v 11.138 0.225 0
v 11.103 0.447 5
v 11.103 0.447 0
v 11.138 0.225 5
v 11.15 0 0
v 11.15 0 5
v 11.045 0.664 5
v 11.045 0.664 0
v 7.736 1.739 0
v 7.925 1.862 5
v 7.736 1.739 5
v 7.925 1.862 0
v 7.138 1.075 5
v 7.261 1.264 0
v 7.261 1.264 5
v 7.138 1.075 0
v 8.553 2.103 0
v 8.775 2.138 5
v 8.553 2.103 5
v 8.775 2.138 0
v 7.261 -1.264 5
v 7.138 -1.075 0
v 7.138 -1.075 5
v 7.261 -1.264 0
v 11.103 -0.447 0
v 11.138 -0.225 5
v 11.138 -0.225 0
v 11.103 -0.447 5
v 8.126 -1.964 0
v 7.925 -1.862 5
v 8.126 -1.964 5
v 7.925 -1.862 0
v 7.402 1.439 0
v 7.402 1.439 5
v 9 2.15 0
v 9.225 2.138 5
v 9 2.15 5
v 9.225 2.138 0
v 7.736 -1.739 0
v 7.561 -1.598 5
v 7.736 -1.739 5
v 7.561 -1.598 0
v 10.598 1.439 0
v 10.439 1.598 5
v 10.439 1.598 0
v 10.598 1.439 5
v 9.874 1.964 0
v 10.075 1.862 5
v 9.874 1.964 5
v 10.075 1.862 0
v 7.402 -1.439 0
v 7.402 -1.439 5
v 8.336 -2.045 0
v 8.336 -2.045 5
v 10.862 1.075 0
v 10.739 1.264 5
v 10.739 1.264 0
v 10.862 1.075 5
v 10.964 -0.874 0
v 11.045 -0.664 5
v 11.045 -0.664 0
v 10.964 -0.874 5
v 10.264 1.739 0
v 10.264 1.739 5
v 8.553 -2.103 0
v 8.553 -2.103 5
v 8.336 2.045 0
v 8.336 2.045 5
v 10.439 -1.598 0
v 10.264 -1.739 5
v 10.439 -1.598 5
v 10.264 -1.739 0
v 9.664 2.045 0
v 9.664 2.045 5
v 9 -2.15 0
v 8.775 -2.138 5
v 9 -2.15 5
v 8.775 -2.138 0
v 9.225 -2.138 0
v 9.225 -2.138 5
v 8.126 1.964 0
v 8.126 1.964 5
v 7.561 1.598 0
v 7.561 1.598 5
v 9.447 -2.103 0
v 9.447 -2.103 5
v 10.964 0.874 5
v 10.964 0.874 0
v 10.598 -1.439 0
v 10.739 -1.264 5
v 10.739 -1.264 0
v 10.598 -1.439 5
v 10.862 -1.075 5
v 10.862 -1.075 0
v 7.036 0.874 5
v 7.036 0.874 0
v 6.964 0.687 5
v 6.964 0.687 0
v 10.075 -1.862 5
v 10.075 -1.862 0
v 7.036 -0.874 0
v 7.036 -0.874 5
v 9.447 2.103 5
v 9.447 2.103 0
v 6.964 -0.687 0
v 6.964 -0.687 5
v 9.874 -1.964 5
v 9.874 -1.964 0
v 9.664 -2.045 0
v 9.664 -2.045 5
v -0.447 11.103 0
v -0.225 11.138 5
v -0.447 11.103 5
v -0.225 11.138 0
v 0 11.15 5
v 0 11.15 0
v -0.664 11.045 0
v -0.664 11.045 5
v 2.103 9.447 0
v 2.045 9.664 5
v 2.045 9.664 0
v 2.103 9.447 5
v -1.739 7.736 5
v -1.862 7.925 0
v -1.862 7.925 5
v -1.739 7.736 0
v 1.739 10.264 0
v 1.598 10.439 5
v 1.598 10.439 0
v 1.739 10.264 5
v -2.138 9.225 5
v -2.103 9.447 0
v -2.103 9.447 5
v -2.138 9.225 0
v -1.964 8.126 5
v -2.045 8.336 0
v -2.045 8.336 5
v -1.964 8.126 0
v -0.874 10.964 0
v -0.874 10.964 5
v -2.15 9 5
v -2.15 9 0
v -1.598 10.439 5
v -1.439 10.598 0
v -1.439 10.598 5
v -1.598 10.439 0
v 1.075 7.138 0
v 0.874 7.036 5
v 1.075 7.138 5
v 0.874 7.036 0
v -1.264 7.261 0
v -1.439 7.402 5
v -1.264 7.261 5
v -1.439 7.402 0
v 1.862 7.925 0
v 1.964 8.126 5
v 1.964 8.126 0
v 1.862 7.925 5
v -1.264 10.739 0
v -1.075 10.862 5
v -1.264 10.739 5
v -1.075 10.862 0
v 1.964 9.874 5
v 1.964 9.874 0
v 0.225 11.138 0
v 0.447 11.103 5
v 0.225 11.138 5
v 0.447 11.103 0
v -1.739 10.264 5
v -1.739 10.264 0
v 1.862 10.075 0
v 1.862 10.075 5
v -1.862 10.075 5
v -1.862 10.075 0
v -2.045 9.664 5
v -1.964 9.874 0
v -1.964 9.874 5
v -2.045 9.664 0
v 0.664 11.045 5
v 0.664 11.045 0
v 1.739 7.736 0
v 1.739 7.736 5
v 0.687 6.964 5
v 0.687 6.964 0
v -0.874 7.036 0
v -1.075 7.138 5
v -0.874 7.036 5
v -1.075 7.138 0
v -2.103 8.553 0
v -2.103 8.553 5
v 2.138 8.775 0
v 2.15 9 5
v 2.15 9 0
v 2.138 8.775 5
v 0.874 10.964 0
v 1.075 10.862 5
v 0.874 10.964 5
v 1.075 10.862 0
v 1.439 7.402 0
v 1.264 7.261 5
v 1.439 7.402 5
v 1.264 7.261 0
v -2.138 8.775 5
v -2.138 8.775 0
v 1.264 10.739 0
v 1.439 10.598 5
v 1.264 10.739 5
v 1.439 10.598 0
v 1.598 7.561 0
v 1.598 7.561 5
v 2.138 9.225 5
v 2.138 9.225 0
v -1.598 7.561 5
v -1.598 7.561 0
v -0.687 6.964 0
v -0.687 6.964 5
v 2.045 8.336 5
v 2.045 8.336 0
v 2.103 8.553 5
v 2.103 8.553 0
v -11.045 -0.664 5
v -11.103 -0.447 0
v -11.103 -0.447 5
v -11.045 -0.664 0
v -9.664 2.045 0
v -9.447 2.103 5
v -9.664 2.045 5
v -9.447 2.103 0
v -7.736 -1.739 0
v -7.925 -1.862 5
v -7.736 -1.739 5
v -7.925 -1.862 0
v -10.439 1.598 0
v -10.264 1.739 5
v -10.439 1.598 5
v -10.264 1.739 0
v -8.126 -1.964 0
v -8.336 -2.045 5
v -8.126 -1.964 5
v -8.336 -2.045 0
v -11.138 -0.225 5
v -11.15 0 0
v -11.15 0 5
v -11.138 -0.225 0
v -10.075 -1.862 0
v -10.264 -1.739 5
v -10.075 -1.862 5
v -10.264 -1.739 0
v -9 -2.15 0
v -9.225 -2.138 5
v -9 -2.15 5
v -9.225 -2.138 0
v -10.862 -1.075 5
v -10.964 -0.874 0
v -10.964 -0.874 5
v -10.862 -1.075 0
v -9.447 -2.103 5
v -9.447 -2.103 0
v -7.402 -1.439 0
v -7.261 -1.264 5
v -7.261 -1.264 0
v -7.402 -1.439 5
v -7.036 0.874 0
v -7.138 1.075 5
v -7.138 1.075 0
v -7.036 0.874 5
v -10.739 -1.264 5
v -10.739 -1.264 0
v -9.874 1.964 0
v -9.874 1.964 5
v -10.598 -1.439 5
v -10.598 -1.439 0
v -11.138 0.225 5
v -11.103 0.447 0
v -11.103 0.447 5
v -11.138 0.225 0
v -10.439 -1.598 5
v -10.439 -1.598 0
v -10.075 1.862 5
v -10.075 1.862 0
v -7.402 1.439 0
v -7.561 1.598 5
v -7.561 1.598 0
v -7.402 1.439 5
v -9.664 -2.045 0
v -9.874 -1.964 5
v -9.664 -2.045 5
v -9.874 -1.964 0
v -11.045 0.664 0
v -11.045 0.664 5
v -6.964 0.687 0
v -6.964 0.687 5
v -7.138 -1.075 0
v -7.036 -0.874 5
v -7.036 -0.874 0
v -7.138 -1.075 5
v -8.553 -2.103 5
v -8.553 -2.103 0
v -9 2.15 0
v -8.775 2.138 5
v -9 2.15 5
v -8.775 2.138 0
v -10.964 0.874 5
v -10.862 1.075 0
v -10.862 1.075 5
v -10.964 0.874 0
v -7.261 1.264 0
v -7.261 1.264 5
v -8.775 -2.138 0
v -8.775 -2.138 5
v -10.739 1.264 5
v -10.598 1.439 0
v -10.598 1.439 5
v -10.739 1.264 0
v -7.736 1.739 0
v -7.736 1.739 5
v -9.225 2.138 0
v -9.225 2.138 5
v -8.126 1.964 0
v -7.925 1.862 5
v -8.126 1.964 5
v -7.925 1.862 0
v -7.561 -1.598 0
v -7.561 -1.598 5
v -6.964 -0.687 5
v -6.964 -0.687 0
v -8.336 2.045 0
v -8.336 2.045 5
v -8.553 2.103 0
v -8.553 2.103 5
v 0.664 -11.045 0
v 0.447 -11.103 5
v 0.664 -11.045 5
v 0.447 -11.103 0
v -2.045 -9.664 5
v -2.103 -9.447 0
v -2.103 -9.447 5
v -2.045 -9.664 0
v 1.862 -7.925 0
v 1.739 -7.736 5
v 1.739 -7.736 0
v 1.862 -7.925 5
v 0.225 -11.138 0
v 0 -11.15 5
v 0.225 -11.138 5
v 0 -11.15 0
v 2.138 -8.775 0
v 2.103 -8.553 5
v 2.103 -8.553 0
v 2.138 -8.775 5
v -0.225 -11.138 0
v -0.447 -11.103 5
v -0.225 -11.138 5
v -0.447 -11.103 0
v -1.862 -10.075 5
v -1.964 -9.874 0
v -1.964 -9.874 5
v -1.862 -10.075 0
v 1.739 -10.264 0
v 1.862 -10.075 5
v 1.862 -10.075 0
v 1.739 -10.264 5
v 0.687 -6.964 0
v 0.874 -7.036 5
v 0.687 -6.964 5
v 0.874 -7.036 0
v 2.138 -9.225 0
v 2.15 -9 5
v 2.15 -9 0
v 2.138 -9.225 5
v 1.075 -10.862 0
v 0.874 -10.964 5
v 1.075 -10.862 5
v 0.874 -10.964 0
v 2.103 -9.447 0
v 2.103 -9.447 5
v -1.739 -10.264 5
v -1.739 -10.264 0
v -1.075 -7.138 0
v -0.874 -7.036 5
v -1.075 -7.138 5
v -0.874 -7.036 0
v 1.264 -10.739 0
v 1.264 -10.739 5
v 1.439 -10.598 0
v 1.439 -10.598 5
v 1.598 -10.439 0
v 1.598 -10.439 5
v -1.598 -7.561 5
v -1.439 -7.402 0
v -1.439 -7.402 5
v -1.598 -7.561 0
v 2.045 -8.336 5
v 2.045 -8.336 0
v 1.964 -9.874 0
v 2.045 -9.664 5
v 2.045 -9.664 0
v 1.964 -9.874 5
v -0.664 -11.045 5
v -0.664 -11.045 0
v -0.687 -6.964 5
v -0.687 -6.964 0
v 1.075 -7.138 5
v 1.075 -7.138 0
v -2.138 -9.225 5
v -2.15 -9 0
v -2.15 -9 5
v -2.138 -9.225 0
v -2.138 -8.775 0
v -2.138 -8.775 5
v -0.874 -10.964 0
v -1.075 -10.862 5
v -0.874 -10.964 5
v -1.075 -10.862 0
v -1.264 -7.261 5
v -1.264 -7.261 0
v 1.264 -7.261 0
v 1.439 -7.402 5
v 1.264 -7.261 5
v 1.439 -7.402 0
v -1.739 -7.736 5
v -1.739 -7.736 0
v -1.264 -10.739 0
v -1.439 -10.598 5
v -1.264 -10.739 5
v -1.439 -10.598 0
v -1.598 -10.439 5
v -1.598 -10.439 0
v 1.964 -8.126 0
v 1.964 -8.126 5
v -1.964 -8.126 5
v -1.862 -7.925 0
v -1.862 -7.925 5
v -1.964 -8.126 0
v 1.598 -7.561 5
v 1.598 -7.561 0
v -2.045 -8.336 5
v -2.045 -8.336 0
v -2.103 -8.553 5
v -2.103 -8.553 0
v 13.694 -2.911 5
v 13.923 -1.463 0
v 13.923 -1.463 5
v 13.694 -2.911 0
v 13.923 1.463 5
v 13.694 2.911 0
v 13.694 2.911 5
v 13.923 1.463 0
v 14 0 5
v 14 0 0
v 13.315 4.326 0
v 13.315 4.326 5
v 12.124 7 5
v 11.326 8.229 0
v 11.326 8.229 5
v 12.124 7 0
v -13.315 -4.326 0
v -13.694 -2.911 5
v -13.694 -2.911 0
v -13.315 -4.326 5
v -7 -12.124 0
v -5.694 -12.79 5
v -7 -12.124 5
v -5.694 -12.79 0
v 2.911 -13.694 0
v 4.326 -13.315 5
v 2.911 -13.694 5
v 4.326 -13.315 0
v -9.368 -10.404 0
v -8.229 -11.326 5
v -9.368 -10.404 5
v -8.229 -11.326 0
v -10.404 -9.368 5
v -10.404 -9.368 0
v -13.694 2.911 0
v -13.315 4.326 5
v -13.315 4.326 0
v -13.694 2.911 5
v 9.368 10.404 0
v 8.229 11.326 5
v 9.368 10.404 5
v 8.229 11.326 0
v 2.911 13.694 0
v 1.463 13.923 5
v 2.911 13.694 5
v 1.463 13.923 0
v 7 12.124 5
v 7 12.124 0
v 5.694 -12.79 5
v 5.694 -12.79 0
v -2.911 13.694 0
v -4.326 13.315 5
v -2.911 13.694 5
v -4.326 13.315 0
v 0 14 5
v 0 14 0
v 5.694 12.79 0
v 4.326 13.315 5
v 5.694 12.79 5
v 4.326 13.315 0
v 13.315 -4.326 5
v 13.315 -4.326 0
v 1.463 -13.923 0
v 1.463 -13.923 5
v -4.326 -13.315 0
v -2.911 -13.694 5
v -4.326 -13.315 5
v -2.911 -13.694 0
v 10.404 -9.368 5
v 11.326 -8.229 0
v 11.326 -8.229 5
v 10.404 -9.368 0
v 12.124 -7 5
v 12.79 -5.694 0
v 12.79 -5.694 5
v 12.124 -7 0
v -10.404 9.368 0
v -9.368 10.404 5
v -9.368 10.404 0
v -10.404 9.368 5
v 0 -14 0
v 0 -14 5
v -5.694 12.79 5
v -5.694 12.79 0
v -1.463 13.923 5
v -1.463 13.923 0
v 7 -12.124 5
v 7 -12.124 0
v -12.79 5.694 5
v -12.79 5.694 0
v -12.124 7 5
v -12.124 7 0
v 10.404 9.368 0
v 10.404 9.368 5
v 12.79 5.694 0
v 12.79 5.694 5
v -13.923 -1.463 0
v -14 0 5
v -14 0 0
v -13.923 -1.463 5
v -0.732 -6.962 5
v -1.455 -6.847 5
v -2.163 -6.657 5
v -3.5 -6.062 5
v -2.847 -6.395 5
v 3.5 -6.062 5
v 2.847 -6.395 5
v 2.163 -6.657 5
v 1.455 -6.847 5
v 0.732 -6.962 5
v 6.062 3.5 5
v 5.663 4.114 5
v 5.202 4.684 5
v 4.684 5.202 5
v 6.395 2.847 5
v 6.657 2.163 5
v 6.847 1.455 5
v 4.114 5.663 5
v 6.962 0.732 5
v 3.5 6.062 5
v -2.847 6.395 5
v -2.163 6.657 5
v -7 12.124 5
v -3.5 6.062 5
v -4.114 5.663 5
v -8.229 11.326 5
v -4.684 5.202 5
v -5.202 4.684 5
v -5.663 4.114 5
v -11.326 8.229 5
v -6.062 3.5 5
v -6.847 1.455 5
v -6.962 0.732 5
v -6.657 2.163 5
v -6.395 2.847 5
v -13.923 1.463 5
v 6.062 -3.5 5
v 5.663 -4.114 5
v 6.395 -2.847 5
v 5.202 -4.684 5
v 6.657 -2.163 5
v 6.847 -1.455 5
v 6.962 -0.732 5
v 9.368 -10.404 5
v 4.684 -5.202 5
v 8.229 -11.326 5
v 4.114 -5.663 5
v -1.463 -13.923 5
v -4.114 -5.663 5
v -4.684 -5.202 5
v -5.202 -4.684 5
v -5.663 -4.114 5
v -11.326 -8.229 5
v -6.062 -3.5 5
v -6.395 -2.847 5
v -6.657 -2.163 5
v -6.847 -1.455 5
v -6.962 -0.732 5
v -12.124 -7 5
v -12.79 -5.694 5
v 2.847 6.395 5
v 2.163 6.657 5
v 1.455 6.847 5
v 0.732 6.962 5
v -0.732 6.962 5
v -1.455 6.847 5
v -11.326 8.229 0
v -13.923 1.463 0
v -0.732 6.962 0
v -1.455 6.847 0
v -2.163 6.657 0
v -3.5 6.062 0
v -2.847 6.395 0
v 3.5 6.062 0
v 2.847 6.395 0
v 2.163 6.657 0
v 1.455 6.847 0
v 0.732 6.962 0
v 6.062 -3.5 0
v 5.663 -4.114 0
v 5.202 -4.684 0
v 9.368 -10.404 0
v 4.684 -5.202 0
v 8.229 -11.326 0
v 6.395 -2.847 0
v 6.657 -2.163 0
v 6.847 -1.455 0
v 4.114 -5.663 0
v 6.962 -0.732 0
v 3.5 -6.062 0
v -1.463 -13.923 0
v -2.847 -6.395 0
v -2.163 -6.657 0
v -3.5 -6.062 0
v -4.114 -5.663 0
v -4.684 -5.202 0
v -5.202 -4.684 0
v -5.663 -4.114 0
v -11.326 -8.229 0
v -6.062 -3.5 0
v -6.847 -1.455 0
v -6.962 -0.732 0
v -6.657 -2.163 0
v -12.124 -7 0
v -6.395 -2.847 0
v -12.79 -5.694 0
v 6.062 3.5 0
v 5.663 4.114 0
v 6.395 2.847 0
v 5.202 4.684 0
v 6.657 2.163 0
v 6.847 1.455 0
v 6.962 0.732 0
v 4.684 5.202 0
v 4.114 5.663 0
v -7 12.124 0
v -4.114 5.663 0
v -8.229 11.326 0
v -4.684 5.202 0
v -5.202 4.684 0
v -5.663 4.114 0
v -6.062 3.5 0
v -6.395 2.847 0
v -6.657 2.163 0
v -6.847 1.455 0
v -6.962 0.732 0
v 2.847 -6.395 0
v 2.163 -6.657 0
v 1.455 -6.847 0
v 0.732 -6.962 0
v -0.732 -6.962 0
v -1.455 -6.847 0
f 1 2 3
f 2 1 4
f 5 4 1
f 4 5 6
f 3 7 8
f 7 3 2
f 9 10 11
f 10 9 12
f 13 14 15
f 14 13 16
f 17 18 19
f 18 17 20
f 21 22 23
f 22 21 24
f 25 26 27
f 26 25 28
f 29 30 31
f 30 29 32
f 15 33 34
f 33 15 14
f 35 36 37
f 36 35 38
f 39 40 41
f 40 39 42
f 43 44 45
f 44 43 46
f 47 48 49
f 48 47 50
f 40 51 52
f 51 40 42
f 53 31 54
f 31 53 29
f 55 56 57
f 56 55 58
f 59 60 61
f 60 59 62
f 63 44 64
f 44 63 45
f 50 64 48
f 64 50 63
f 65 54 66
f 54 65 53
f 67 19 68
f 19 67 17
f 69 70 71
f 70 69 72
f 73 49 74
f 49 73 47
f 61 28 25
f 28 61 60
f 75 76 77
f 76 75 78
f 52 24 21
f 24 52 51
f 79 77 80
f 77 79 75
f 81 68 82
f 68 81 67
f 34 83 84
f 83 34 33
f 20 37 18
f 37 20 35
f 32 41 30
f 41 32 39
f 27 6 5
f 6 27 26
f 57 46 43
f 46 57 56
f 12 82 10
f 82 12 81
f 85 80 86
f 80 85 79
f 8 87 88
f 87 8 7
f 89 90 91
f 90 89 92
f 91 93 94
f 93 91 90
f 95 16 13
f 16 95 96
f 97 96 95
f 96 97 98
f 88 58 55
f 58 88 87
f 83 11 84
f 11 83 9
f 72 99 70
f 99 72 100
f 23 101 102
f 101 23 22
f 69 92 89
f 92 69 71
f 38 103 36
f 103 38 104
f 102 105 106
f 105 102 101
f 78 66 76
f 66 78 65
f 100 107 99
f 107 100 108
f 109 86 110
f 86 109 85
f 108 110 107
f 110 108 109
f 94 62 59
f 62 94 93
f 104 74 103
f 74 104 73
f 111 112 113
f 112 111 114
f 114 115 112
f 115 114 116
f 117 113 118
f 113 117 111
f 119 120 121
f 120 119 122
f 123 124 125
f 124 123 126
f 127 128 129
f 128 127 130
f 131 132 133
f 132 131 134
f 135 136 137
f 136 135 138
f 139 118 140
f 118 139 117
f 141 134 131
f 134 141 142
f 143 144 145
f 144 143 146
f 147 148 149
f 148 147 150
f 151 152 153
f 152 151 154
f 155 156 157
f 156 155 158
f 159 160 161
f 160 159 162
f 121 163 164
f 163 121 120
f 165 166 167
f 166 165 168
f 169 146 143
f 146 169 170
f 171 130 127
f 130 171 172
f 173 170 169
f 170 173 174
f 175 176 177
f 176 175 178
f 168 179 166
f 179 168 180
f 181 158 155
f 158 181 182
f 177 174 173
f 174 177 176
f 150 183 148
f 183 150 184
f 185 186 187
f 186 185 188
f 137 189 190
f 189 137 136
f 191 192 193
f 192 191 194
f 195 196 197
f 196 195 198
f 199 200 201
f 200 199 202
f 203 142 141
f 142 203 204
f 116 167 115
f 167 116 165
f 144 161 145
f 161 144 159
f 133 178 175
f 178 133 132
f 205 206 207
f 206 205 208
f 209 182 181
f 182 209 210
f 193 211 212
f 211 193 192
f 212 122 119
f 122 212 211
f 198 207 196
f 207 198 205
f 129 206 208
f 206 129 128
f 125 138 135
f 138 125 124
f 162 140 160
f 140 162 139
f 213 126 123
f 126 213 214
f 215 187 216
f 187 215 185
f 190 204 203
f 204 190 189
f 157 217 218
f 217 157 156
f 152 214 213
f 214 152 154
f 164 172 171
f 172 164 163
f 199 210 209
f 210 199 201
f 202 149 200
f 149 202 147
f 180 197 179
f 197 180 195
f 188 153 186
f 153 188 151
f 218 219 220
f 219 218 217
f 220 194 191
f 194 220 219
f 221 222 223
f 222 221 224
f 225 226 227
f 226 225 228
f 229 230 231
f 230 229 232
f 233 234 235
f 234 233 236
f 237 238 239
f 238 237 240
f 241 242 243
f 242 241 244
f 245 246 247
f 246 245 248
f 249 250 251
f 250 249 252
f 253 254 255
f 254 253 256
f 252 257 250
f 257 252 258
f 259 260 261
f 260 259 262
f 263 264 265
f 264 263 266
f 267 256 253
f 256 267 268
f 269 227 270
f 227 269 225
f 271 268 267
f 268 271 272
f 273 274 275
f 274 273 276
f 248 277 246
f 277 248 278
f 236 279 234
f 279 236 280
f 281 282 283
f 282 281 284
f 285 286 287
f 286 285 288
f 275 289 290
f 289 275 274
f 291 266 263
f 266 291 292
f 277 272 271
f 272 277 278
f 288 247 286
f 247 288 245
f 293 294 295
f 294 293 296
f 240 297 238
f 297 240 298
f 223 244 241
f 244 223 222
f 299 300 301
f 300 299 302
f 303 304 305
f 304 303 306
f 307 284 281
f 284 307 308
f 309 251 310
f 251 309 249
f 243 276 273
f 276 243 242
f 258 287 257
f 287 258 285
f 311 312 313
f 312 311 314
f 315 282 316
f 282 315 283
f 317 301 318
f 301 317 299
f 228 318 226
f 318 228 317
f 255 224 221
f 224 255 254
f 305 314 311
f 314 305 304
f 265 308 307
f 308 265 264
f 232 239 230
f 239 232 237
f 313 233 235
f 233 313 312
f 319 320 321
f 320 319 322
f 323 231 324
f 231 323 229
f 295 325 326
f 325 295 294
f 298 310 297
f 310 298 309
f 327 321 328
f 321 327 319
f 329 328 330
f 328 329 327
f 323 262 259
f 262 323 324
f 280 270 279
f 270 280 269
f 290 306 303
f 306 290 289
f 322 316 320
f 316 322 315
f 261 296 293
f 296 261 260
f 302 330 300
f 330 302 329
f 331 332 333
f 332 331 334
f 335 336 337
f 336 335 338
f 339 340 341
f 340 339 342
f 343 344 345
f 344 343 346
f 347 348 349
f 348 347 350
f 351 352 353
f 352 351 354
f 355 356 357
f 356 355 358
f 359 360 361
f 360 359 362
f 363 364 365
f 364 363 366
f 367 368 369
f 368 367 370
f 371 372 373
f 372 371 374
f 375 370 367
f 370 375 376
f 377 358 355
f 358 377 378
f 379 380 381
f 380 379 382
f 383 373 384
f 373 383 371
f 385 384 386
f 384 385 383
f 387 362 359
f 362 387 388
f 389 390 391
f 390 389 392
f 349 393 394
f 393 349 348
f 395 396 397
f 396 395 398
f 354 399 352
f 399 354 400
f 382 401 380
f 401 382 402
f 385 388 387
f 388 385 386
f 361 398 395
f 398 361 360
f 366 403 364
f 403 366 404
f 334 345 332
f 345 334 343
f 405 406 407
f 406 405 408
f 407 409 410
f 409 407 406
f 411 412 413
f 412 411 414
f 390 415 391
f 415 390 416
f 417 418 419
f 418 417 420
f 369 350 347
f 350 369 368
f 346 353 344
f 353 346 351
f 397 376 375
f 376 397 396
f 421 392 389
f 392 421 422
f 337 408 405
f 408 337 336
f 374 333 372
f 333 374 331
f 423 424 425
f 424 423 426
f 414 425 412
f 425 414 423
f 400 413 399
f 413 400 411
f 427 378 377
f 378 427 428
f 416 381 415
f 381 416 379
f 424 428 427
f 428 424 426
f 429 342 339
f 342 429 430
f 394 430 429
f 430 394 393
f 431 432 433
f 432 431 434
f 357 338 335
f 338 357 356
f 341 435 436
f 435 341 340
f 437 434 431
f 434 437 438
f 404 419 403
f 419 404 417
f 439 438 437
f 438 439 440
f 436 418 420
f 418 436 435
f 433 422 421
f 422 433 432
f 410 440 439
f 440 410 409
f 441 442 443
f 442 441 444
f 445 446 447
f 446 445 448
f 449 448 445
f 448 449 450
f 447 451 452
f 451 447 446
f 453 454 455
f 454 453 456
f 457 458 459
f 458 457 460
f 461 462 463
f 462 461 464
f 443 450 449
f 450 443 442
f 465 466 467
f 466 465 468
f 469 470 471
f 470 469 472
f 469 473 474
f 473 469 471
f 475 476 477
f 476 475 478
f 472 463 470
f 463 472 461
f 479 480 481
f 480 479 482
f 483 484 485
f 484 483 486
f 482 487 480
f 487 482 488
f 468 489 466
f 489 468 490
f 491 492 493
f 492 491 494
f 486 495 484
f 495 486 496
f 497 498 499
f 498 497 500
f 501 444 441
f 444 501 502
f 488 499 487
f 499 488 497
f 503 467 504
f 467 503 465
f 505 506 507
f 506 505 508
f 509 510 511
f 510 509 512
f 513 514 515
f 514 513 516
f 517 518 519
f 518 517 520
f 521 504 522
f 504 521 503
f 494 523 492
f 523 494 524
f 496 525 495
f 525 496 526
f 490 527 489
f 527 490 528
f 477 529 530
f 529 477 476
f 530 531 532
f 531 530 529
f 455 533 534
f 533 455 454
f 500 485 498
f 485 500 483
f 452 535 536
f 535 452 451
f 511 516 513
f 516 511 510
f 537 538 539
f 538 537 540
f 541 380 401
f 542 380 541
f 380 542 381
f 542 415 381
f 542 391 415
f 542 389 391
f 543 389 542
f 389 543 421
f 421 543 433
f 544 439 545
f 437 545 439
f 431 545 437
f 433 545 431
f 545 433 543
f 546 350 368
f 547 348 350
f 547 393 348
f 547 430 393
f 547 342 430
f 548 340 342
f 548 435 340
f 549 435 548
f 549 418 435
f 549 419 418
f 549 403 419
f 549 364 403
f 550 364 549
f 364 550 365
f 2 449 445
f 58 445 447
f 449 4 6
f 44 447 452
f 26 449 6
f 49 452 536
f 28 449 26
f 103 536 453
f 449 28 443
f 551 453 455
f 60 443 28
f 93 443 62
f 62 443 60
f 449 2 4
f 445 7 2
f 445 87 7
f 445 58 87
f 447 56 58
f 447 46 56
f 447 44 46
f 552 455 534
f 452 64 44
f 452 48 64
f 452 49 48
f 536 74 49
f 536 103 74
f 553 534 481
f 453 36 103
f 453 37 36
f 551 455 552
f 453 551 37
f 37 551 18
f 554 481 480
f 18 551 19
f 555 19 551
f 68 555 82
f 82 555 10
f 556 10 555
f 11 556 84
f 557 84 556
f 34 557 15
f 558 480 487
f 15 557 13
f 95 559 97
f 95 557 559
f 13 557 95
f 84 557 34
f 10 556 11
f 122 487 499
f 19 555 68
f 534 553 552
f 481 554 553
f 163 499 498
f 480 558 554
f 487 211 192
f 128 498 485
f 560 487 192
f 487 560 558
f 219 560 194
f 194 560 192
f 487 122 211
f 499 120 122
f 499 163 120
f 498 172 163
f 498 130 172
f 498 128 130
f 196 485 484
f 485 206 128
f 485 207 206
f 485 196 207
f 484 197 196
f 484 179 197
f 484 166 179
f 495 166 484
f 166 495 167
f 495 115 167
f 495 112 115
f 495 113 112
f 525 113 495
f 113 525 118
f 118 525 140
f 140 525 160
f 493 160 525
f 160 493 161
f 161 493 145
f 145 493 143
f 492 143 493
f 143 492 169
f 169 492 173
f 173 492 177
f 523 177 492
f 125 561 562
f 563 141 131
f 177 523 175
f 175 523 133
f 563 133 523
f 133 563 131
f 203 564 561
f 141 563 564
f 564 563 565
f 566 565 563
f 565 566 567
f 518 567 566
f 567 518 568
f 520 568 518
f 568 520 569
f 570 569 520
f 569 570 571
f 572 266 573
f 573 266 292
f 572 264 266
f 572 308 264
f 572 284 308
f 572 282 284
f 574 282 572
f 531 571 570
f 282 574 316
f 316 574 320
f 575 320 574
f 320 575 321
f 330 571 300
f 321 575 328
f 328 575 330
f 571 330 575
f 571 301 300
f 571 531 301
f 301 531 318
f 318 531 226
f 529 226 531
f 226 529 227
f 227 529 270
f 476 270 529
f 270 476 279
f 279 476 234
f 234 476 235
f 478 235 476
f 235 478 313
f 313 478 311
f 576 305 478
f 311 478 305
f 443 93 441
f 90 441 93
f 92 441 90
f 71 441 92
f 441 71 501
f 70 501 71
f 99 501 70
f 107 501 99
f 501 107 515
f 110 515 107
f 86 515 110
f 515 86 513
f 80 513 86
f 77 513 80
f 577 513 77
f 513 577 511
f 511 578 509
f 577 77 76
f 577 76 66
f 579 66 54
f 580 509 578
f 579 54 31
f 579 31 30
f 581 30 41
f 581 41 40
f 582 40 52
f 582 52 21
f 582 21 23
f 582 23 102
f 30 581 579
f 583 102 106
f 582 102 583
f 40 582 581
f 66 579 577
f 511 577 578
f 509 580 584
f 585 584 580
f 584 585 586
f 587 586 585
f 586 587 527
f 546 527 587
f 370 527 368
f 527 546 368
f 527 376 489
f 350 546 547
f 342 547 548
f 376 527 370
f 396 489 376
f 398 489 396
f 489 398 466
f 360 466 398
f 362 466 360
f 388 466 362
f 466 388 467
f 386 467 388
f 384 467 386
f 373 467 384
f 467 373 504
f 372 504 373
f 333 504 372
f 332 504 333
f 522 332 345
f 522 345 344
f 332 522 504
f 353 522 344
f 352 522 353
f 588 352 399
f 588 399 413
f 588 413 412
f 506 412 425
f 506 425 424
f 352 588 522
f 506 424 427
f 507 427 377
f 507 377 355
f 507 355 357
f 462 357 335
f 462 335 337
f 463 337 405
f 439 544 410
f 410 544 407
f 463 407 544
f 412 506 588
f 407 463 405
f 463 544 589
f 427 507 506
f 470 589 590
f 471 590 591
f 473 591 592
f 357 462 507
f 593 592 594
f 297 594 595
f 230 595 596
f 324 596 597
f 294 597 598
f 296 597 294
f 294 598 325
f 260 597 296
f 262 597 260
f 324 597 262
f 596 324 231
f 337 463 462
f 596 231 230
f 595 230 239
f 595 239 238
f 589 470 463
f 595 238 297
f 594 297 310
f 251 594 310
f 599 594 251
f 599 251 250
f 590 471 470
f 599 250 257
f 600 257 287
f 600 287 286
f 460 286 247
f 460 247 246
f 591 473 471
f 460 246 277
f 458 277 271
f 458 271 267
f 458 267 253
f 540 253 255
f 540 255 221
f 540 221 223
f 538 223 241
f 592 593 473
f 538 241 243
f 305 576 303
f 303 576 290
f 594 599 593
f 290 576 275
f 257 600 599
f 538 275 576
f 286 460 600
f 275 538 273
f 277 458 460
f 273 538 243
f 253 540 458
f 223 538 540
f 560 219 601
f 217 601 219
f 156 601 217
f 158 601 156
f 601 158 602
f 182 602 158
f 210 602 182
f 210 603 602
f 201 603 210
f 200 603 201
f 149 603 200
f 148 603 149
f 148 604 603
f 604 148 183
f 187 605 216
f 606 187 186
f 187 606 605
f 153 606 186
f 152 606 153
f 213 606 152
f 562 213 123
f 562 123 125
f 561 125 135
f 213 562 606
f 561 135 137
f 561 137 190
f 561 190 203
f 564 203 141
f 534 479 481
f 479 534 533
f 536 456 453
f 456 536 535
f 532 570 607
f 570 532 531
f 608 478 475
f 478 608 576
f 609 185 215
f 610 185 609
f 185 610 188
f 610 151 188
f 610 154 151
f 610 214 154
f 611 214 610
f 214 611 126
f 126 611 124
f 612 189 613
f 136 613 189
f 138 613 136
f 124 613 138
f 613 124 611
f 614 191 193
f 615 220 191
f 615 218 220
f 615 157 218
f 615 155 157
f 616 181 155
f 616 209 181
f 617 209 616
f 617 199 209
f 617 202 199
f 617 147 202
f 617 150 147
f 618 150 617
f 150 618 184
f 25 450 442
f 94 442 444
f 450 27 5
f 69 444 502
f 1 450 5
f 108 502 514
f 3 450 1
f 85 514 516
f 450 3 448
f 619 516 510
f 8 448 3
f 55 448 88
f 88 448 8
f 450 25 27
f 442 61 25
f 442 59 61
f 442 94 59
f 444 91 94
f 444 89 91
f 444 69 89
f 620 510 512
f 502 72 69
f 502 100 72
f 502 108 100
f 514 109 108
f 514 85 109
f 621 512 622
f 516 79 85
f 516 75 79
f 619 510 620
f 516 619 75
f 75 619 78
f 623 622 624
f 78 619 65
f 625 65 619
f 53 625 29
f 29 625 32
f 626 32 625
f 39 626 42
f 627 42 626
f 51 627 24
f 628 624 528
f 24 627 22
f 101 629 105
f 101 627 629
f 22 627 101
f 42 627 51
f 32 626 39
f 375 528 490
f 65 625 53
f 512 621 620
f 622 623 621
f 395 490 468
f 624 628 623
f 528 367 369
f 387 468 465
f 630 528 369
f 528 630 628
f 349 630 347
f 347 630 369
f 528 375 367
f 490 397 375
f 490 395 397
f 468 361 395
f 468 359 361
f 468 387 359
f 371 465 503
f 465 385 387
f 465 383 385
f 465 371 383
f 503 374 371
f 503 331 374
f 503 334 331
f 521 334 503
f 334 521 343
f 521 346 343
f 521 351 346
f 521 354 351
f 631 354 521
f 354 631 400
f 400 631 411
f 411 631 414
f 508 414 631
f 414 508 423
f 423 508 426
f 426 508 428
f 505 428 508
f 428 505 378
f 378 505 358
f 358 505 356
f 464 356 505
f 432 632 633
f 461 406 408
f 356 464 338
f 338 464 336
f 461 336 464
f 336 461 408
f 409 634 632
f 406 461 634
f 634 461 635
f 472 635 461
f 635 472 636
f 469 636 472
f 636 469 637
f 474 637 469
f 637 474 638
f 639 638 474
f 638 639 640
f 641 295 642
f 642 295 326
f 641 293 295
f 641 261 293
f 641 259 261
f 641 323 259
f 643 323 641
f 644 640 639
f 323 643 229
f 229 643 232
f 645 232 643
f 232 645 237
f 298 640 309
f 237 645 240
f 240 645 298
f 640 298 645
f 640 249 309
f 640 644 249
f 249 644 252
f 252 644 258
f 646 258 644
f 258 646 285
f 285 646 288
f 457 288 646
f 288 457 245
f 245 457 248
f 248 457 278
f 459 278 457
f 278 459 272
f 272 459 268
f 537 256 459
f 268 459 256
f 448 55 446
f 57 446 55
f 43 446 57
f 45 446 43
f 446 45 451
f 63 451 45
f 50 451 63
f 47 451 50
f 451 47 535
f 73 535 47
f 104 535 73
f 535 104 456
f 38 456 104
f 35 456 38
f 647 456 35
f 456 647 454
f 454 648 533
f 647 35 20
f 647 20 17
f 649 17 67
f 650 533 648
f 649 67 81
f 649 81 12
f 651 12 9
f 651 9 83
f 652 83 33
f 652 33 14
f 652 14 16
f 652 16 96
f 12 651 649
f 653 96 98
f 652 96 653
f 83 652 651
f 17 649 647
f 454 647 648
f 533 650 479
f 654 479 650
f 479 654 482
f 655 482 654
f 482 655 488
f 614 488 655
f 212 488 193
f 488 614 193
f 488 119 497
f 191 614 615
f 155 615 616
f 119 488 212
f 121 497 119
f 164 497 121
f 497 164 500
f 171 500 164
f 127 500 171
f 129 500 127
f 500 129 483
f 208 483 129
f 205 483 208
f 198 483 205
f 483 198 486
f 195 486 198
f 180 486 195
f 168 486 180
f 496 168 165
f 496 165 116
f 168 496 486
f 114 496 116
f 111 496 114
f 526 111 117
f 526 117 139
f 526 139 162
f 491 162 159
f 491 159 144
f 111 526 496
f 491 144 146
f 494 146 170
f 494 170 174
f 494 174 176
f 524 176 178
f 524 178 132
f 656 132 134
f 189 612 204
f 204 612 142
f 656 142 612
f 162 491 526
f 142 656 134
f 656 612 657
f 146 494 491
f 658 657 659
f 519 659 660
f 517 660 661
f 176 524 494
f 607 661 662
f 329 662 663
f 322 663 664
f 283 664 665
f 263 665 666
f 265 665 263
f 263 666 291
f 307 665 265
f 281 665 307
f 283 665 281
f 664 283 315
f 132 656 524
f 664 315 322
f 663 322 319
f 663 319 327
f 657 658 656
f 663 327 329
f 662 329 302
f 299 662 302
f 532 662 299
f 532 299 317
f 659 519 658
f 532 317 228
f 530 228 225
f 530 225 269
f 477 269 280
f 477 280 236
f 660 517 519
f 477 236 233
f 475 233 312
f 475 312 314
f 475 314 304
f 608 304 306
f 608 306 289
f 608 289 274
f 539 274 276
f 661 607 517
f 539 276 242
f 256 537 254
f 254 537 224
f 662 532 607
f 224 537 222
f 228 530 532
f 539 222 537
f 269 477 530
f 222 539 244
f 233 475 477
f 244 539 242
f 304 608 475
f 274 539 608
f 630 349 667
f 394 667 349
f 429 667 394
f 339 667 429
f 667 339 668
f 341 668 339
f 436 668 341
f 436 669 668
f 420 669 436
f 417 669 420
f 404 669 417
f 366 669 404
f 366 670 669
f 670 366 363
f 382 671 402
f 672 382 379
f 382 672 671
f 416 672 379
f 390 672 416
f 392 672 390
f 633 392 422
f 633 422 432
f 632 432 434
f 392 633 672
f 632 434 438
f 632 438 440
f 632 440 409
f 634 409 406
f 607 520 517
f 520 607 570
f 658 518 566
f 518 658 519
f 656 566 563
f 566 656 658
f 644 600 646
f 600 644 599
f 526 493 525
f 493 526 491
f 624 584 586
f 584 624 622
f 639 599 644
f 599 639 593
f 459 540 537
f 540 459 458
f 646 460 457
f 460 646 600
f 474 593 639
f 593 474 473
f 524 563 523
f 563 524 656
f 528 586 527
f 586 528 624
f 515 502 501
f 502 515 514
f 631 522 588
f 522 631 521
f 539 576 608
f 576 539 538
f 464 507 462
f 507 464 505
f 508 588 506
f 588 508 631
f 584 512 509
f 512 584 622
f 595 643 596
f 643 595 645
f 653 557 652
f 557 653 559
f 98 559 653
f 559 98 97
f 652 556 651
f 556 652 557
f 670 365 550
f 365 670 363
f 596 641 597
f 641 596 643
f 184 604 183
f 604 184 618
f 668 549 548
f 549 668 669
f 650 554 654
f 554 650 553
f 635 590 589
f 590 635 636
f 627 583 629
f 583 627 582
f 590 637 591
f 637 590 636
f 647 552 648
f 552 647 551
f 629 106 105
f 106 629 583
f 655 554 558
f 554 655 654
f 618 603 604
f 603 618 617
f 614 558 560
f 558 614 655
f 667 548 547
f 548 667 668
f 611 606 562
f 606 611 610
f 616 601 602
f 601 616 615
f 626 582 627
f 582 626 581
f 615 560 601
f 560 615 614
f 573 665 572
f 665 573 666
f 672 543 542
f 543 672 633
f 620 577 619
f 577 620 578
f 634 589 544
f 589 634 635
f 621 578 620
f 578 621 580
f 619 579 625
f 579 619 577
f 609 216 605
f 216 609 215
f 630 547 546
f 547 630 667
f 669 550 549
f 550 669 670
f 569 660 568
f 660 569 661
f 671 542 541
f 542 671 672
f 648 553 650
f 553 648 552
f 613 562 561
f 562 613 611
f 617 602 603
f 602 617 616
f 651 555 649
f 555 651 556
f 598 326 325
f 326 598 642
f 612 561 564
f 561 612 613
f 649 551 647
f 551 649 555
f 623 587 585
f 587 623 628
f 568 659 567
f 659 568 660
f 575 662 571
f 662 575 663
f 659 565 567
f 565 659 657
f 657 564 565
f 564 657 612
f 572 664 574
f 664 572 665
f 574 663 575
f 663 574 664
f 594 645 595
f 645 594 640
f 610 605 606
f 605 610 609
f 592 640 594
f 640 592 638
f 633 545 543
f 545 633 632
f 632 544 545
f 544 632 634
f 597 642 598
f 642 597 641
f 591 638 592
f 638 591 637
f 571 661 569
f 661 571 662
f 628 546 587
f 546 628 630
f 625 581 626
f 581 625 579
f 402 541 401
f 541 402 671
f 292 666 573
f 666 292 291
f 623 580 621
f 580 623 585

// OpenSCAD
// Shaft-seal holder plate.
$fn = 60;
eps = 0.02;
seal_d = 14;
outer_d = 28;
plate_t = 5;
difference() { cylinder(d=outer_d,h=plate_t); translate([0,0,-eps]) cylinder(d=seal_d,h=plate_t+2*eps); for(i=[0:3]) rotate([0,0,i*90]) translate([outer_d/2-5,0,-eps]) cylinder(d=4.3,h=plate_t+2*eps); }
